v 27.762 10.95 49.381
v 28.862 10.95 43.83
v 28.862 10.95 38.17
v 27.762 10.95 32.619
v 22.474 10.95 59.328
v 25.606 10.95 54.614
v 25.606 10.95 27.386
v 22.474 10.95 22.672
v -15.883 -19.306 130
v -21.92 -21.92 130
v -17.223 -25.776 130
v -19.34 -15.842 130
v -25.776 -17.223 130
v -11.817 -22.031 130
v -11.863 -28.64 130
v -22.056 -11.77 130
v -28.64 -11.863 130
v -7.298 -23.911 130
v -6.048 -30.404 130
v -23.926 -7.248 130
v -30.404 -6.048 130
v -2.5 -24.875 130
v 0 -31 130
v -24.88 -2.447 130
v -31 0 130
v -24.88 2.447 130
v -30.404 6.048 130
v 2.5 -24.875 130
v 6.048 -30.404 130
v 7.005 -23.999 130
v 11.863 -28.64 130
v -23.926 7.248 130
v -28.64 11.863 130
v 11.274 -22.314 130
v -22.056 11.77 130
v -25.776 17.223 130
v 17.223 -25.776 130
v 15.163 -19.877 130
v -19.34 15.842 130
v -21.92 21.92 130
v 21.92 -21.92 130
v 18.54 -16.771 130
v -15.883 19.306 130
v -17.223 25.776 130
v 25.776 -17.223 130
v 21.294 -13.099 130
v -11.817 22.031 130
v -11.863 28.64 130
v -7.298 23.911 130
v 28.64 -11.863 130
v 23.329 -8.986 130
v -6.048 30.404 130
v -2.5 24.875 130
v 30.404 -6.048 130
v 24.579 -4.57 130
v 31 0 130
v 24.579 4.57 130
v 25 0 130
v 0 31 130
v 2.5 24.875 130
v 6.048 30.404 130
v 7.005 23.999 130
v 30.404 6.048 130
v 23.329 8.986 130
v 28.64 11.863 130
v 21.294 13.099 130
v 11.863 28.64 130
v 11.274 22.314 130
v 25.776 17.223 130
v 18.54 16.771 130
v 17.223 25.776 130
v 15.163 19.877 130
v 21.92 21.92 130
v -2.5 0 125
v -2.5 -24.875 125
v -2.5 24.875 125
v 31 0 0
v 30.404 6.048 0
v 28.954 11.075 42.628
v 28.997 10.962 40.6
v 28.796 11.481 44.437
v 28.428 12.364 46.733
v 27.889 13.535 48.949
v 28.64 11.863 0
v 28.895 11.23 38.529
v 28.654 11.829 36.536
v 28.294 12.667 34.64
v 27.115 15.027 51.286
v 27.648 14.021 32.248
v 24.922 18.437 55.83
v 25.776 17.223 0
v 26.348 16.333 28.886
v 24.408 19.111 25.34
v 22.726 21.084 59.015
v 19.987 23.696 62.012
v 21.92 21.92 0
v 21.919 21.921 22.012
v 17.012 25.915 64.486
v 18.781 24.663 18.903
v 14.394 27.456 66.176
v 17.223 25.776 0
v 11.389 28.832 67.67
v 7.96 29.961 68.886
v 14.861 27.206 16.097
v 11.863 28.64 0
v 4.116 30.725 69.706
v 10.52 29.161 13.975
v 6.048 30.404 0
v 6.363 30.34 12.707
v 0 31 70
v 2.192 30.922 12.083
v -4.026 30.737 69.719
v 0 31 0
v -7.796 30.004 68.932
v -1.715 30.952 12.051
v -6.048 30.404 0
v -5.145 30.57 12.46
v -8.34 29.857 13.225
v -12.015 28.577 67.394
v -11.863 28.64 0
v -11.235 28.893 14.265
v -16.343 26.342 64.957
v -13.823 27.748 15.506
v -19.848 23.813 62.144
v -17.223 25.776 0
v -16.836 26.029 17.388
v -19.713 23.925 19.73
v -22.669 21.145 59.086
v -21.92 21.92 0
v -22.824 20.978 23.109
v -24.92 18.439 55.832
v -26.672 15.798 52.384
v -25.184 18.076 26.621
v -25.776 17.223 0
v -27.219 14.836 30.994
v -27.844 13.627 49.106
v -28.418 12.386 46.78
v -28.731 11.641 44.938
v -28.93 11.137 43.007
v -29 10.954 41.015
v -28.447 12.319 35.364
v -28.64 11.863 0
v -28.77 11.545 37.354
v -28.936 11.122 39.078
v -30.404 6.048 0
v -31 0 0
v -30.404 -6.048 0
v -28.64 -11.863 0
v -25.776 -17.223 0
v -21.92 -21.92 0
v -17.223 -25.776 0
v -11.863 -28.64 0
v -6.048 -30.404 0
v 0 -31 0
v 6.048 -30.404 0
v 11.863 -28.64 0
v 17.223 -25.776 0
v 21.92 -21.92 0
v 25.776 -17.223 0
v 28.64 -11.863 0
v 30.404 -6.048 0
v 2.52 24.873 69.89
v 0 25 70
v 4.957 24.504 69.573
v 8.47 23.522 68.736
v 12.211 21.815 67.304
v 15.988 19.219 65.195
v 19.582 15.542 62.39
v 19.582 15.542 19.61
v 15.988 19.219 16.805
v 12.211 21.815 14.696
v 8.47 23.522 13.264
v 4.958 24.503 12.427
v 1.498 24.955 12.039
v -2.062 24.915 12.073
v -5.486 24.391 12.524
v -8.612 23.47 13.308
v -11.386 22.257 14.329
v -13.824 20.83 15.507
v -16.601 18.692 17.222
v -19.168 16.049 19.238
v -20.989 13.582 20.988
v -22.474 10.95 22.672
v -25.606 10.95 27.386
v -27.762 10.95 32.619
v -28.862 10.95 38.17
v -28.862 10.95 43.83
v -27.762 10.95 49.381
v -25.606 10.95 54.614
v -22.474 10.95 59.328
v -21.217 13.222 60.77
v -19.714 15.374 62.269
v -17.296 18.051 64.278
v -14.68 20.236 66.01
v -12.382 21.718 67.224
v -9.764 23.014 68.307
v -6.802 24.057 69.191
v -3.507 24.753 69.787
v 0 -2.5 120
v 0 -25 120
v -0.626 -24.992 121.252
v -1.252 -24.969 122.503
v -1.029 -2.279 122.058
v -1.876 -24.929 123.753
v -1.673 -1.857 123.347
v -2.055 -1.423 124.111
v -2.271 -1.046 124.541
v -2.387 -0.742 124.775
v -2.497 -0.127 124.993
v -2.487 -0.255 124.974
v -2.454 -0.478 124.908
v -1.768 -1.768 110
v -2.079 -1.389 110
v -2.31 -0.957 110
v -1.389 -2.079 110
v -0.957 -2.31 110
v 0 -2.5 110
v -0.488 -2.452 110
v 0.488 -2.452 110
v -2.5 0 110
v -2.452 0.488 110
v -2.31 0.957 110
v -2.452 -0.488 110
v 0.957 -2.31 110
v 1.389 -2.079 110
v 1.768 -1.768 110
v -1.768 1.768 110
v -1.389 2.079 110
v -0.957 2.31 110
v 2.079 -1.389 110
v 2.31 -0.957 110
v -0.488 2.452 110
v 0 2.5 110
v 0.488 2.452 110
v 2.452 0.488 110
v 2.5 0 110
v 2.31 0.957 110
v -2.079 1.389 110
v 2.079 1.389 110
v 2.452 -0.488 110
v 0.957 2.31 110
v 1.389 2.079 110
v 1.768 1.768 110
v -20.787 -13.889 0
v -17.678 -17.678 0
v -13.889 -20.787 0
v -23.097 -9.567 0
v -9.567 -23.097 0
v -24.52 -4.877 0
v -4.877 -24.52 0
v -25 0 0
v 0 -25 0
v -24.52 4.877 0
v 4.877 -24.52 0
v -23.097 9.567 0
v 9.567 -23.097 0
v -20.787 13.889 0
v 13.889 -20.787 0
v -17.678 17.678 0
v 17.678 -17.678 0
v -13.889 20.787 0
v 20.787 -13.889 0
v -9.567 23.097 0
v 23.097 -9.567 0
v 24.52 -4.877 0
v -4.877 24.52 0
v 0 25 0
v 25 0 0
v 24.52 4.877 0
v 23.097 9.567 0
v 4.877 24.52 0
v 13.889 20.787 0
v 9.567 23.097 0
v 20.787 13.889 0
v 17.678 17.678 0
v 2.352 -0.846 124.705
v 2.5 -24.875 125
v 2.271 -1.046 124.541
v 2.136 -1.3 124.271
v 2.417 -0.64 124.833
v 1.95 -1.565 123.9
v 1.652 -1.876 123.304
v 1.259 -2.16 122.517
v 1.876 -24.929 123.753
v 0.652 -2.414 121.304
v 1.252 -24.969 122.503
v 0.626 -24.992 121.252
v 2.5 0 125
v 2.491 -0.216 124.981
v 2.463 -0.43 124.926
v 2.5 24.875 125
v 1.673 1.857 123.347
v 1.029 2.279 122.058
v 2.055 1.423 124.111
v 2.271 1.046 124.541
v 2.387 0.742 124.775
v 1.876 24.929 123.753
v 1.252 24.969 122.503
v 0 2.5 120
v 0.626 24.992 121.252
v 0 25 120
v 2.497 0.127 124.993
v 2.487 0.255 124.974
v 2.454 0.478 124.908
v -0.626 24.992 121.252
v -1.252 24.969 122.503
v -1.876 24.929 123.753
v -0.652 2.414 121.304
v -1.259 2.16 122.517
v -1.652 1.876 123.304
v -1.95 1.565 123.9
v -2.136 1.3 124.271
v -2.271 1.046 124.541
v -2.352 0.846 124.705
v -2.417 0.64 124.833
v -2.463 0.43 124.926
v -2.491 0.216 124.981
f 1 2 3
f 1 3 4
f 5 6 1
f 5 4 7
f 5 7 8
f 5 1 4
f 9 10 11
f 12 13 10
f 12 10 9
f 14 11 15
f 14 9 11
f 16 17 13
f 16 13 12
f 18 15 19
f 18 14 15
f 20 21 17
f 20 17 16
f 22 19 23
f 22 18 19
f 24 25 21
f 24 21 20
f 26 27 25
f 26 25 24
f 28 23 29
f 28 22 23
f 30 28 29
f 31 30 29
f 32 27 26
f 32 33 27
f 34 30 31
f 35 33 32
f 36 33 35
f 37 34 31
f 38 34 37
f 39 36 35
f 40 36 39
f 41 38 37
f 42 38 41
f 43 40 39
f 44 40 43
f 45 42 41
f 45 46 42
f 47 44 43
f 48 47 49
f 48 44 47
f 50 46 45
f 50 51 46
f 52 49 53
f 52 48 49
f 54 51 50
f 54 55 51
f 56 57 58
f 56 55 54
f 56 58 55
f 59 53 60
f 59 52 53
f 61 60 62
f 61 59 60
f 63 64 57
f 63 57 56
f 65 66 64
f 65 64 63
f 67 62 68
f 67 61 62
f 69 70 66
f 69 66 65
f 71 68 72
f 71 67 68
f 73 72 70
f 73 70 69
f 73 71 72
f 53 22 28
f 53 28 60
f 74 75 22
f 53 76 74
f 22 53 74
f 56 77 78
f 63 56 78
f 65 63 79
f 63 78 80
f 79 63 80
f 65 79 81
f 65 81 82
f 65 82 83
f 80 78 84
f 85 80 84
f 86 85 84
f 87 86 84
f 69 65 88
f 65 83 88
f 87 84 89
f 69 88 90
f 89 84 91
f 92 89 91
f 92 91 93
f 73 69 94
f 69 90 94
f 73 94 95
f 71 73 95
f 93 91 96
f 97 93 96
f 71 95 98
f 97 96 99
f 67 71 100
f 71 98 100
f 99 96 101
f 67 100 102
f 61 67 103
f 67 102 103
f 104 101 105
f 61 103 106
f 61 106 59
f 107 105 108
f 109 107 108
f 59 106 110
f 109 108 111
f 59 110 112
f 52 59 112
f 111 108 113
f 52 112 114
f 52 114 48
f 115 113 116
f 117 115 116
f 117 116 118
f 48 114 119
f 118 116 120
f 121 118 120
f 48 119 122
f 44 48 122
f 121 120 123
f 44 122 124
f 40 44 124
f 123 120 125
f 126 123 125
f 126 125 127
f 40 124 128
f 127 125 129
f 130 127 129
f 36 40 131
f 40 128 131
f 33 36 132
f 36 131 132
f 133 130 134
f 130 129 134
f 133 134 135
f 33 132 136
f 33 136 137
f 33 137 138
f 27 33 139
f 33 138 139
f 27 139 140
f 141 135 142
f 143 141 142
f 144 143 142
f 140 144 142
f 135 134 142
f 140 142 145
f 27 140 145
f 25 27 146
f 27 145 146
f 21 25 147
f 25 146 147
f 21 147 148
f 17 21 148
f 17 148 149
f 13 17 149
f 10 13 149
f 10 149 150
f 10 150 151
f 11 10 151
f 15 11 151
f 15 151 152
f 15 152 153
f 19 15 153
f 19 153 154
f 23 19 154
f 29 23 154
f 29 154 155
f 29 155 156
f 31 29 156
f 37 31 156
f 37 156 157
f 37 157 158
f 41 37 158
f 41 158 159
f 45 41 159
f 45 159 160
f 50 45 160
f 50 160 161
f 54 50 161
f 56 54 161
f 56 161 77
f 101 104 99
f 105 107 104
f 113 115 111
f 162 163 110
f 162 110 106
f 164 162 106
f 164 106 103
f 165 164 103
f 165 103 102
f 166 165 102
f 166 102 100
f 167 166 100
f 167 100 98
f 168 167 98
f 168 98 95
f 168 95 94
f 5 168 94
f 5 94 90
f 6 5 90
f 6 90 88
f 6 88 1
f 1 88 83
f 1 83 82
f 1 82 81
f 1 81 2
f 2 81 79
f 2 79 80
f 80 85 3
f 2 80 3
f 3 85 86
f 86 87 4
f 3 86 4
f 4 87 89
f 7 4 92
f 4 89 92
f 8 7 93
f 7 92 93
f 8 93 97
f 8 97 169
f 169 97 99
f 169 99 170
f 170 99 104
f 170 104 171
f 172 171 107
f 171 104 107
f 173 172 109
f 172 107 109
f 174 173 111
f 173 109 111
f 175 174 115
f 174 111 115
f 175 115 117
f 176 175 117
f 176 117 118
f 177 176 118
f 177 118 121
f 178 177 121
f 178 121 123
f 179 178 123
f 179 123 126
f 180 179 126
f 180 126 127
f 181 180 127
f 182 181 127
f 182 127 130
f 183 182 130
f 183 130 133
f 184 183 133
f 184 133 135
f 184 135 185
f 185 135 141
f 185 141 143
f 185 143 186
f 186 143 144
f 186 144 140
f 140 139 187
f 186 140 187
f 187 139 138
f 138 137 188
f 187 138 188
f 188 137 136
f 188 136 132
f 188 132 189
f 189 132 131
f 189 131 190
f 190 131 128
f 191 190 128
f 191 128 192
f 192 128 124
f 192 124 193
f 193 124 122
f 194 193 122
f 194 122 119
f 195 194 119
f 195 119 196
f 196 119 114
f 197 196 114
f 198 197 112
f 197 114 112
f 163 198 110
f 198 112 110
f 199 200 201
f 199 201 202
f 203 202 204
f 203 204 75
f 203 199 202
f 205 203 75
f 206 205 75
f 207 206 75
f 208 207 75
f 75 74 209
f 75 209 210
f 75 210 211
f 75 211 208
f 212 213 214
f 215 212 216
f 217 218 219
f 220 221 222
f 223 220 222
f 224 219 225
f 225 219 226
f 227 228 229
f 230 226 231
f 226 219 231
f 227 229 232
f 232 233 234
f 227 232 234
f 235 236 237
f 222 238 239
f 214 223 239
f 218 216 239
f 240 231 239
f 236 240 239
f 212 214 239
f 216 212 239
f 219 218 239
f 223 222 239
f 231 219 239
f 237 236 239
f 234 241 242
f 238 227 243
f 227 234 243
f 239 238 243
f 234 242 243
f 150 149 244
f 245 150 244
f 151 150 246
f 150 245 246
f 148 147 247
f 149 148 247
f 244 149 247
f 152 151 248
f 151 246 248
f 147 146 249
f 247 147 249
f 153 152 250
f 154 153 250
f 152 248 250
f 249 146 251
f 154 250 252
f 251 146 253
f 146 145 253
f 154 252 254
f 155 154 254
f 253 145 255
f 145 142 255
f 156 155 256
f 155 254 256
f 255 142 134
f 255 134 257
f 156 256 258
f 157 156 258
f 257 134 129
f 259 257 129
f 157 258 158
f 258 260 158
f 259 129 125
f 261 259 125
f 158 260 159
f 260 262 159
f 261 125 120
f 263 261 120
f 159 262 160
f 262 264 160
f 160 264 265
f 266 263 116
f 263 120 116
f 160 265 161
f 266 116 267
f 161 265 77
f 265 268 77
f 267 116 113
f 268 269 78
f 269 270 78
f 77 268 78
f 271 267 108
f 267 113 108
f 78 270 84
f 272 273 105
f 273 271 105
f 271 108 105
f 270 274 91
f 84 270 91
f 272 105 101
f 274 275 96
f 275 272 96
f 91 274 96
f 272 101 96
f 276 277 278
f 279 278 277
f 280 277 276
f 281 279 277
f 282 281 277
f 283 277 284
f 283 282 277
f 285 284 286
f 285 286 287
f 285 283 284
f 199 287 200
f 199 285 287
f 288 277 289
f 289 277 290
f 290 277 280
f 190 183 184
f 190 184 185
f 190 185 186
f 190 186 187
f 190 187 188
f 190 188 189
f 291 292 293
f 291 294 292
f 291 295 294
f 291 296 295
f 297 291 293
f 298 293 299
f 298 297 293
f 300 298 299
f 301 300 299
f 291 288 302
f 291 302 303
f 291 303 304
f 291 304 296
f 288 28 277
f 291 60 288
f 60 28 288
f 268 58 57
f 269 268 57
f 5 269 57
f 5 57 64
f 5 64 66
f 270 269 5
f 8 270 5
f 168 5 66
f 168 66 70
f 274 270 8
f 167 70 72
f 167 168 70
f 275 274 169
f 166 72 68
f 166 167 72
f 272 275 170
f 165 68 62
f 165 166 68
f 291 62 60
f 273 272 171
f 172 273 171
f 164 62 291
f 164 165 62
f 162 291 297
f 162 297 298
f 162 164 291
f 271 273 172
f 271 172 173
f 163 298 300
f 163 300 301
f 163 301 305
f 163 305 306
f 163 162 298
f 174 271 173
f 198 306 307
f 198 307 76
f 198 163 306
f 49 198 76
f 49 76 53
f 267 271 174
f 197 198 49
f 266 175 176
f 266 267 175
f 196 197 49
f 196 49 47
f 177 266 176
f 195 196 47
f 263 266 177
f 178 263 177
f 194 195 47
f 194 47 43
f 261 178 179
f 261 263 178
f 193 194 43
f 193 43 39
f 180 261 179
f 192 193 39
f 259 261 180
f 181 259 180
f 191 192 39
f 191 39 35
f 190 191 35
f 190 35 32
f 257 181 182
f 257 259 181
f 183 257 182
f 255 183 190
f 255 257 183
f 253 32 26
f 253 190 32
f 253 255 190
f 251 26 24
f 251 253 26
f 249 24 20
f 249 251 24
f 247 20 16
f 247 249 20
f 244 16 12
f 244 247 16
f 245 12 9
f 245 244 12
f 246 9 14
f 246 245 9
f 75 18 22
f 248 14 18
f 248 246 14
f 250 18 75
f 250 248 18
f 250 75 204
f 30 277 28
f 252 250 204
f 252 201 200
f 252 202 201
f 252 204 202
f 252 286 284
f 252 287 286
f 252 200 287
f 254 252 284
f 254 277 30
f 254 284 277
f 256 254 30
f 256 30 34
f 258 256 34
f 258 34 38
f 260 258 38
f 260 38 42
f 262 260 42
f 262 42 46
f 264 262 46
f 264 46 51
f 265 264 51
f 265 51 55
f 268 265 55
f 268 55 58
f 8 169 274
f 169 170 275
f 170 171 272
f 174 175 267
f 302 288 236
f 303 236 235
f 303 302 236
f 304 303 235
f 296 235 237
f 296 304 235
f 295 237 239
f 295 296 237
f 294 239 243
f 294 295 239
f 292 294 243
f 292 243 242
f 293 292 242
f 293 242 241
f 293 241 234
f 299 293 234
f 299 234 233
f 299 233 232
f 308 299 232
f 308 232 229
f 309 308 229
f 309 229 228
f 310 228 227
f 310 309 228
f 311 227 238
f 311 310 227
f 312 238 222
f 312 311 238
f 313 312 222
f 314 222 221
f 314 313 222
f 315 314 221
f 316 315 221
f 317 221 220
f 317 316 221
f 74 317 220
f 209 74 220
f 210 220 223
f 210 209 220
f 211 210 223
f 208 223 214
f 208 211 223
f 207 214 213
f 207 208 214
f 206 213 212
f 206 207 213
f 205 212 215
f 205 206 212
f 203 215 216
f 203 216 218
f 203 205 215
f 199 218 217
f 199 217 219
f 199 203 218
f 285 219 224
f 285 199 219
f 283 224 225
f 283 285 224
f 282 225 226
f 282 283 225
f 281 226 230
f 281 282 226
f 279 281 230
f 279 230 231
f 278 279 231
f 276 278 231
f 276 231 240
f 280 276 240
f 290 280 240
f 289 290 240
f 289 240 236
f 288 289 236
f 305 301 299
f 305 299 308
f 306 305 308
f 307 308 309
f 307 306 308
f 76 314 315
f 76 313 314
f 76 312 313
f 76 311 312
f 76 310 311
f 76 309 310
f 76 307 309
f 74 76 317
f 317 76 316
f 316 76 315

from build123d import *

# Parameters (mm, degrees)
CROQUIS1_R                               = 31
CROQUIS1_R_2                             = 25
SALIENTE_EXTRUIR1_DEPTH                  = 130
CROQUIS3_R                               = 29
CORTAR_EXTRUIR1_DEPTH                    = 29.05
SALIENTE_EXTRUIR2_REACH                  = 139.193
SALIENTE_EXTRUIR2_END_RADIUS             = 25
SALIENTE_EXTRUIR2_DIRECTION_2_REACH      = 139.193
SALIENTE_EXTRUIR2_DIRECTION_2_END_RADIUS = 25
CROQUIS6_R                               = 2.5
SALIENTE_EXTRUIR3_DEPTH                  = 20


with BuildPart() as part:
    # Croquis1 → Saliente-Extruir1 (new body)
    with BuildSketch(Plane.XY):
        Circle(CROQUIS1_R)
        Circle(CROQUIS1_R_2, mode=Mode.SUBTRACT)
    extrude(amount=SALIENTE_EXTRUIR1_DEPTH)

    # Croquis3 → Cortar-Extruir1 (cut)
    with BuildSketch(Plane(origin=(0, 40, 0), x_dir=(1, 0, 0), z_dir=(0, 1, 0))):
        with Locations(Location((0, -41, 0), (0, 0, 270))):
            Circle(CROQUIS3_R)
    extrude(amount=-CORTAR_EXTRUIR1_DEPTH, mode=Mode.SUBTRACT)

    # Saliente-Extruir2: up to this cylinder (the profile starts inside it)
    saliente_extruir2_end = Plane(origin=(0, 0, 126.111111), z_dir=(0, 0, -1)) * Cylinder(SALIENTE_EXTRUIR2_END_RADIUS, 329.386, mode=Mode.PRIVATE)
    # Croquis5 → Saliente-Extruir2 (add, up to the surface)
    with BuildSketch(Plane(origin=(0, 0, 0), x_dir=(1, 0, 0), z_dir=(0, 1, 0)), mode=Mode.PRIVATE) as saliente_extruir2_sk1:
        Polygon((-2.5, -130), (2.5, -130), (2.5, -125), (0, -120), (-2.5, -125), align=None)
    saliente_extruir2_tool1 = extrude(saliente_extruir2_sk1.sketch, amount=SALIENTE_EXTRUIR2_REACH, mode=Mode.PRIVATE) & saliente_extruir2_end
    add(saliente_extruir2_tool1.solids().sort_by_distance((0, 0, 126.111111))[0])

    # Saliente-Extruir2 direction 2: up to this cylinder (the profile starts inside it)
    saliente_extruir2_direction_2_end = Plane(origin=(0, 0, 126.111111), z_dir=(0, 0, -1)) * Cylinder(SALIENTE_EXTRUIR2_DIRECTION_2_END_RADIUS, 329.386, mode=Mode.PRIVATE)
    # Croquis5 → Saliente-Extruir2 direction 2 (add, up to the surface)
    with BuildSketch(Plane(origin=(0, 0, 0), x_dir=(1, 0, 0), z_dir=(0, 1, 0)), mode=Mode.PRIVATE) as saliente_extruir2_direction_2_sk1:
        Polygon((-2.5, -130), (2.5, -130), (2.5, -125), (0, -120), (-2.5, -125), align=None)
    saliente_extruir2_direction_2_tool1 = extrude(saliente_extruir2_direction_2_sk1.sketch, amount=-SALIENTE_EXTRUIR2_DIRECTION_2_REACH, mode=Mode.PRIVATE) & saliente_extruir2_direction_2_end
    add(saliente_extruir2_direction_2_tool1.solids().sort_by_distance((0, 0, 126.111111))[0])

    # Croquis6 → Saliente-Extruir3 (add)
    with BuildSketch(Plane.XY.offset(130)):
        Circle(CROQUIS6_R)
    extrude(amount=-SALIENTE_EXTRUIR3_DEPTH)


solid = part.part
